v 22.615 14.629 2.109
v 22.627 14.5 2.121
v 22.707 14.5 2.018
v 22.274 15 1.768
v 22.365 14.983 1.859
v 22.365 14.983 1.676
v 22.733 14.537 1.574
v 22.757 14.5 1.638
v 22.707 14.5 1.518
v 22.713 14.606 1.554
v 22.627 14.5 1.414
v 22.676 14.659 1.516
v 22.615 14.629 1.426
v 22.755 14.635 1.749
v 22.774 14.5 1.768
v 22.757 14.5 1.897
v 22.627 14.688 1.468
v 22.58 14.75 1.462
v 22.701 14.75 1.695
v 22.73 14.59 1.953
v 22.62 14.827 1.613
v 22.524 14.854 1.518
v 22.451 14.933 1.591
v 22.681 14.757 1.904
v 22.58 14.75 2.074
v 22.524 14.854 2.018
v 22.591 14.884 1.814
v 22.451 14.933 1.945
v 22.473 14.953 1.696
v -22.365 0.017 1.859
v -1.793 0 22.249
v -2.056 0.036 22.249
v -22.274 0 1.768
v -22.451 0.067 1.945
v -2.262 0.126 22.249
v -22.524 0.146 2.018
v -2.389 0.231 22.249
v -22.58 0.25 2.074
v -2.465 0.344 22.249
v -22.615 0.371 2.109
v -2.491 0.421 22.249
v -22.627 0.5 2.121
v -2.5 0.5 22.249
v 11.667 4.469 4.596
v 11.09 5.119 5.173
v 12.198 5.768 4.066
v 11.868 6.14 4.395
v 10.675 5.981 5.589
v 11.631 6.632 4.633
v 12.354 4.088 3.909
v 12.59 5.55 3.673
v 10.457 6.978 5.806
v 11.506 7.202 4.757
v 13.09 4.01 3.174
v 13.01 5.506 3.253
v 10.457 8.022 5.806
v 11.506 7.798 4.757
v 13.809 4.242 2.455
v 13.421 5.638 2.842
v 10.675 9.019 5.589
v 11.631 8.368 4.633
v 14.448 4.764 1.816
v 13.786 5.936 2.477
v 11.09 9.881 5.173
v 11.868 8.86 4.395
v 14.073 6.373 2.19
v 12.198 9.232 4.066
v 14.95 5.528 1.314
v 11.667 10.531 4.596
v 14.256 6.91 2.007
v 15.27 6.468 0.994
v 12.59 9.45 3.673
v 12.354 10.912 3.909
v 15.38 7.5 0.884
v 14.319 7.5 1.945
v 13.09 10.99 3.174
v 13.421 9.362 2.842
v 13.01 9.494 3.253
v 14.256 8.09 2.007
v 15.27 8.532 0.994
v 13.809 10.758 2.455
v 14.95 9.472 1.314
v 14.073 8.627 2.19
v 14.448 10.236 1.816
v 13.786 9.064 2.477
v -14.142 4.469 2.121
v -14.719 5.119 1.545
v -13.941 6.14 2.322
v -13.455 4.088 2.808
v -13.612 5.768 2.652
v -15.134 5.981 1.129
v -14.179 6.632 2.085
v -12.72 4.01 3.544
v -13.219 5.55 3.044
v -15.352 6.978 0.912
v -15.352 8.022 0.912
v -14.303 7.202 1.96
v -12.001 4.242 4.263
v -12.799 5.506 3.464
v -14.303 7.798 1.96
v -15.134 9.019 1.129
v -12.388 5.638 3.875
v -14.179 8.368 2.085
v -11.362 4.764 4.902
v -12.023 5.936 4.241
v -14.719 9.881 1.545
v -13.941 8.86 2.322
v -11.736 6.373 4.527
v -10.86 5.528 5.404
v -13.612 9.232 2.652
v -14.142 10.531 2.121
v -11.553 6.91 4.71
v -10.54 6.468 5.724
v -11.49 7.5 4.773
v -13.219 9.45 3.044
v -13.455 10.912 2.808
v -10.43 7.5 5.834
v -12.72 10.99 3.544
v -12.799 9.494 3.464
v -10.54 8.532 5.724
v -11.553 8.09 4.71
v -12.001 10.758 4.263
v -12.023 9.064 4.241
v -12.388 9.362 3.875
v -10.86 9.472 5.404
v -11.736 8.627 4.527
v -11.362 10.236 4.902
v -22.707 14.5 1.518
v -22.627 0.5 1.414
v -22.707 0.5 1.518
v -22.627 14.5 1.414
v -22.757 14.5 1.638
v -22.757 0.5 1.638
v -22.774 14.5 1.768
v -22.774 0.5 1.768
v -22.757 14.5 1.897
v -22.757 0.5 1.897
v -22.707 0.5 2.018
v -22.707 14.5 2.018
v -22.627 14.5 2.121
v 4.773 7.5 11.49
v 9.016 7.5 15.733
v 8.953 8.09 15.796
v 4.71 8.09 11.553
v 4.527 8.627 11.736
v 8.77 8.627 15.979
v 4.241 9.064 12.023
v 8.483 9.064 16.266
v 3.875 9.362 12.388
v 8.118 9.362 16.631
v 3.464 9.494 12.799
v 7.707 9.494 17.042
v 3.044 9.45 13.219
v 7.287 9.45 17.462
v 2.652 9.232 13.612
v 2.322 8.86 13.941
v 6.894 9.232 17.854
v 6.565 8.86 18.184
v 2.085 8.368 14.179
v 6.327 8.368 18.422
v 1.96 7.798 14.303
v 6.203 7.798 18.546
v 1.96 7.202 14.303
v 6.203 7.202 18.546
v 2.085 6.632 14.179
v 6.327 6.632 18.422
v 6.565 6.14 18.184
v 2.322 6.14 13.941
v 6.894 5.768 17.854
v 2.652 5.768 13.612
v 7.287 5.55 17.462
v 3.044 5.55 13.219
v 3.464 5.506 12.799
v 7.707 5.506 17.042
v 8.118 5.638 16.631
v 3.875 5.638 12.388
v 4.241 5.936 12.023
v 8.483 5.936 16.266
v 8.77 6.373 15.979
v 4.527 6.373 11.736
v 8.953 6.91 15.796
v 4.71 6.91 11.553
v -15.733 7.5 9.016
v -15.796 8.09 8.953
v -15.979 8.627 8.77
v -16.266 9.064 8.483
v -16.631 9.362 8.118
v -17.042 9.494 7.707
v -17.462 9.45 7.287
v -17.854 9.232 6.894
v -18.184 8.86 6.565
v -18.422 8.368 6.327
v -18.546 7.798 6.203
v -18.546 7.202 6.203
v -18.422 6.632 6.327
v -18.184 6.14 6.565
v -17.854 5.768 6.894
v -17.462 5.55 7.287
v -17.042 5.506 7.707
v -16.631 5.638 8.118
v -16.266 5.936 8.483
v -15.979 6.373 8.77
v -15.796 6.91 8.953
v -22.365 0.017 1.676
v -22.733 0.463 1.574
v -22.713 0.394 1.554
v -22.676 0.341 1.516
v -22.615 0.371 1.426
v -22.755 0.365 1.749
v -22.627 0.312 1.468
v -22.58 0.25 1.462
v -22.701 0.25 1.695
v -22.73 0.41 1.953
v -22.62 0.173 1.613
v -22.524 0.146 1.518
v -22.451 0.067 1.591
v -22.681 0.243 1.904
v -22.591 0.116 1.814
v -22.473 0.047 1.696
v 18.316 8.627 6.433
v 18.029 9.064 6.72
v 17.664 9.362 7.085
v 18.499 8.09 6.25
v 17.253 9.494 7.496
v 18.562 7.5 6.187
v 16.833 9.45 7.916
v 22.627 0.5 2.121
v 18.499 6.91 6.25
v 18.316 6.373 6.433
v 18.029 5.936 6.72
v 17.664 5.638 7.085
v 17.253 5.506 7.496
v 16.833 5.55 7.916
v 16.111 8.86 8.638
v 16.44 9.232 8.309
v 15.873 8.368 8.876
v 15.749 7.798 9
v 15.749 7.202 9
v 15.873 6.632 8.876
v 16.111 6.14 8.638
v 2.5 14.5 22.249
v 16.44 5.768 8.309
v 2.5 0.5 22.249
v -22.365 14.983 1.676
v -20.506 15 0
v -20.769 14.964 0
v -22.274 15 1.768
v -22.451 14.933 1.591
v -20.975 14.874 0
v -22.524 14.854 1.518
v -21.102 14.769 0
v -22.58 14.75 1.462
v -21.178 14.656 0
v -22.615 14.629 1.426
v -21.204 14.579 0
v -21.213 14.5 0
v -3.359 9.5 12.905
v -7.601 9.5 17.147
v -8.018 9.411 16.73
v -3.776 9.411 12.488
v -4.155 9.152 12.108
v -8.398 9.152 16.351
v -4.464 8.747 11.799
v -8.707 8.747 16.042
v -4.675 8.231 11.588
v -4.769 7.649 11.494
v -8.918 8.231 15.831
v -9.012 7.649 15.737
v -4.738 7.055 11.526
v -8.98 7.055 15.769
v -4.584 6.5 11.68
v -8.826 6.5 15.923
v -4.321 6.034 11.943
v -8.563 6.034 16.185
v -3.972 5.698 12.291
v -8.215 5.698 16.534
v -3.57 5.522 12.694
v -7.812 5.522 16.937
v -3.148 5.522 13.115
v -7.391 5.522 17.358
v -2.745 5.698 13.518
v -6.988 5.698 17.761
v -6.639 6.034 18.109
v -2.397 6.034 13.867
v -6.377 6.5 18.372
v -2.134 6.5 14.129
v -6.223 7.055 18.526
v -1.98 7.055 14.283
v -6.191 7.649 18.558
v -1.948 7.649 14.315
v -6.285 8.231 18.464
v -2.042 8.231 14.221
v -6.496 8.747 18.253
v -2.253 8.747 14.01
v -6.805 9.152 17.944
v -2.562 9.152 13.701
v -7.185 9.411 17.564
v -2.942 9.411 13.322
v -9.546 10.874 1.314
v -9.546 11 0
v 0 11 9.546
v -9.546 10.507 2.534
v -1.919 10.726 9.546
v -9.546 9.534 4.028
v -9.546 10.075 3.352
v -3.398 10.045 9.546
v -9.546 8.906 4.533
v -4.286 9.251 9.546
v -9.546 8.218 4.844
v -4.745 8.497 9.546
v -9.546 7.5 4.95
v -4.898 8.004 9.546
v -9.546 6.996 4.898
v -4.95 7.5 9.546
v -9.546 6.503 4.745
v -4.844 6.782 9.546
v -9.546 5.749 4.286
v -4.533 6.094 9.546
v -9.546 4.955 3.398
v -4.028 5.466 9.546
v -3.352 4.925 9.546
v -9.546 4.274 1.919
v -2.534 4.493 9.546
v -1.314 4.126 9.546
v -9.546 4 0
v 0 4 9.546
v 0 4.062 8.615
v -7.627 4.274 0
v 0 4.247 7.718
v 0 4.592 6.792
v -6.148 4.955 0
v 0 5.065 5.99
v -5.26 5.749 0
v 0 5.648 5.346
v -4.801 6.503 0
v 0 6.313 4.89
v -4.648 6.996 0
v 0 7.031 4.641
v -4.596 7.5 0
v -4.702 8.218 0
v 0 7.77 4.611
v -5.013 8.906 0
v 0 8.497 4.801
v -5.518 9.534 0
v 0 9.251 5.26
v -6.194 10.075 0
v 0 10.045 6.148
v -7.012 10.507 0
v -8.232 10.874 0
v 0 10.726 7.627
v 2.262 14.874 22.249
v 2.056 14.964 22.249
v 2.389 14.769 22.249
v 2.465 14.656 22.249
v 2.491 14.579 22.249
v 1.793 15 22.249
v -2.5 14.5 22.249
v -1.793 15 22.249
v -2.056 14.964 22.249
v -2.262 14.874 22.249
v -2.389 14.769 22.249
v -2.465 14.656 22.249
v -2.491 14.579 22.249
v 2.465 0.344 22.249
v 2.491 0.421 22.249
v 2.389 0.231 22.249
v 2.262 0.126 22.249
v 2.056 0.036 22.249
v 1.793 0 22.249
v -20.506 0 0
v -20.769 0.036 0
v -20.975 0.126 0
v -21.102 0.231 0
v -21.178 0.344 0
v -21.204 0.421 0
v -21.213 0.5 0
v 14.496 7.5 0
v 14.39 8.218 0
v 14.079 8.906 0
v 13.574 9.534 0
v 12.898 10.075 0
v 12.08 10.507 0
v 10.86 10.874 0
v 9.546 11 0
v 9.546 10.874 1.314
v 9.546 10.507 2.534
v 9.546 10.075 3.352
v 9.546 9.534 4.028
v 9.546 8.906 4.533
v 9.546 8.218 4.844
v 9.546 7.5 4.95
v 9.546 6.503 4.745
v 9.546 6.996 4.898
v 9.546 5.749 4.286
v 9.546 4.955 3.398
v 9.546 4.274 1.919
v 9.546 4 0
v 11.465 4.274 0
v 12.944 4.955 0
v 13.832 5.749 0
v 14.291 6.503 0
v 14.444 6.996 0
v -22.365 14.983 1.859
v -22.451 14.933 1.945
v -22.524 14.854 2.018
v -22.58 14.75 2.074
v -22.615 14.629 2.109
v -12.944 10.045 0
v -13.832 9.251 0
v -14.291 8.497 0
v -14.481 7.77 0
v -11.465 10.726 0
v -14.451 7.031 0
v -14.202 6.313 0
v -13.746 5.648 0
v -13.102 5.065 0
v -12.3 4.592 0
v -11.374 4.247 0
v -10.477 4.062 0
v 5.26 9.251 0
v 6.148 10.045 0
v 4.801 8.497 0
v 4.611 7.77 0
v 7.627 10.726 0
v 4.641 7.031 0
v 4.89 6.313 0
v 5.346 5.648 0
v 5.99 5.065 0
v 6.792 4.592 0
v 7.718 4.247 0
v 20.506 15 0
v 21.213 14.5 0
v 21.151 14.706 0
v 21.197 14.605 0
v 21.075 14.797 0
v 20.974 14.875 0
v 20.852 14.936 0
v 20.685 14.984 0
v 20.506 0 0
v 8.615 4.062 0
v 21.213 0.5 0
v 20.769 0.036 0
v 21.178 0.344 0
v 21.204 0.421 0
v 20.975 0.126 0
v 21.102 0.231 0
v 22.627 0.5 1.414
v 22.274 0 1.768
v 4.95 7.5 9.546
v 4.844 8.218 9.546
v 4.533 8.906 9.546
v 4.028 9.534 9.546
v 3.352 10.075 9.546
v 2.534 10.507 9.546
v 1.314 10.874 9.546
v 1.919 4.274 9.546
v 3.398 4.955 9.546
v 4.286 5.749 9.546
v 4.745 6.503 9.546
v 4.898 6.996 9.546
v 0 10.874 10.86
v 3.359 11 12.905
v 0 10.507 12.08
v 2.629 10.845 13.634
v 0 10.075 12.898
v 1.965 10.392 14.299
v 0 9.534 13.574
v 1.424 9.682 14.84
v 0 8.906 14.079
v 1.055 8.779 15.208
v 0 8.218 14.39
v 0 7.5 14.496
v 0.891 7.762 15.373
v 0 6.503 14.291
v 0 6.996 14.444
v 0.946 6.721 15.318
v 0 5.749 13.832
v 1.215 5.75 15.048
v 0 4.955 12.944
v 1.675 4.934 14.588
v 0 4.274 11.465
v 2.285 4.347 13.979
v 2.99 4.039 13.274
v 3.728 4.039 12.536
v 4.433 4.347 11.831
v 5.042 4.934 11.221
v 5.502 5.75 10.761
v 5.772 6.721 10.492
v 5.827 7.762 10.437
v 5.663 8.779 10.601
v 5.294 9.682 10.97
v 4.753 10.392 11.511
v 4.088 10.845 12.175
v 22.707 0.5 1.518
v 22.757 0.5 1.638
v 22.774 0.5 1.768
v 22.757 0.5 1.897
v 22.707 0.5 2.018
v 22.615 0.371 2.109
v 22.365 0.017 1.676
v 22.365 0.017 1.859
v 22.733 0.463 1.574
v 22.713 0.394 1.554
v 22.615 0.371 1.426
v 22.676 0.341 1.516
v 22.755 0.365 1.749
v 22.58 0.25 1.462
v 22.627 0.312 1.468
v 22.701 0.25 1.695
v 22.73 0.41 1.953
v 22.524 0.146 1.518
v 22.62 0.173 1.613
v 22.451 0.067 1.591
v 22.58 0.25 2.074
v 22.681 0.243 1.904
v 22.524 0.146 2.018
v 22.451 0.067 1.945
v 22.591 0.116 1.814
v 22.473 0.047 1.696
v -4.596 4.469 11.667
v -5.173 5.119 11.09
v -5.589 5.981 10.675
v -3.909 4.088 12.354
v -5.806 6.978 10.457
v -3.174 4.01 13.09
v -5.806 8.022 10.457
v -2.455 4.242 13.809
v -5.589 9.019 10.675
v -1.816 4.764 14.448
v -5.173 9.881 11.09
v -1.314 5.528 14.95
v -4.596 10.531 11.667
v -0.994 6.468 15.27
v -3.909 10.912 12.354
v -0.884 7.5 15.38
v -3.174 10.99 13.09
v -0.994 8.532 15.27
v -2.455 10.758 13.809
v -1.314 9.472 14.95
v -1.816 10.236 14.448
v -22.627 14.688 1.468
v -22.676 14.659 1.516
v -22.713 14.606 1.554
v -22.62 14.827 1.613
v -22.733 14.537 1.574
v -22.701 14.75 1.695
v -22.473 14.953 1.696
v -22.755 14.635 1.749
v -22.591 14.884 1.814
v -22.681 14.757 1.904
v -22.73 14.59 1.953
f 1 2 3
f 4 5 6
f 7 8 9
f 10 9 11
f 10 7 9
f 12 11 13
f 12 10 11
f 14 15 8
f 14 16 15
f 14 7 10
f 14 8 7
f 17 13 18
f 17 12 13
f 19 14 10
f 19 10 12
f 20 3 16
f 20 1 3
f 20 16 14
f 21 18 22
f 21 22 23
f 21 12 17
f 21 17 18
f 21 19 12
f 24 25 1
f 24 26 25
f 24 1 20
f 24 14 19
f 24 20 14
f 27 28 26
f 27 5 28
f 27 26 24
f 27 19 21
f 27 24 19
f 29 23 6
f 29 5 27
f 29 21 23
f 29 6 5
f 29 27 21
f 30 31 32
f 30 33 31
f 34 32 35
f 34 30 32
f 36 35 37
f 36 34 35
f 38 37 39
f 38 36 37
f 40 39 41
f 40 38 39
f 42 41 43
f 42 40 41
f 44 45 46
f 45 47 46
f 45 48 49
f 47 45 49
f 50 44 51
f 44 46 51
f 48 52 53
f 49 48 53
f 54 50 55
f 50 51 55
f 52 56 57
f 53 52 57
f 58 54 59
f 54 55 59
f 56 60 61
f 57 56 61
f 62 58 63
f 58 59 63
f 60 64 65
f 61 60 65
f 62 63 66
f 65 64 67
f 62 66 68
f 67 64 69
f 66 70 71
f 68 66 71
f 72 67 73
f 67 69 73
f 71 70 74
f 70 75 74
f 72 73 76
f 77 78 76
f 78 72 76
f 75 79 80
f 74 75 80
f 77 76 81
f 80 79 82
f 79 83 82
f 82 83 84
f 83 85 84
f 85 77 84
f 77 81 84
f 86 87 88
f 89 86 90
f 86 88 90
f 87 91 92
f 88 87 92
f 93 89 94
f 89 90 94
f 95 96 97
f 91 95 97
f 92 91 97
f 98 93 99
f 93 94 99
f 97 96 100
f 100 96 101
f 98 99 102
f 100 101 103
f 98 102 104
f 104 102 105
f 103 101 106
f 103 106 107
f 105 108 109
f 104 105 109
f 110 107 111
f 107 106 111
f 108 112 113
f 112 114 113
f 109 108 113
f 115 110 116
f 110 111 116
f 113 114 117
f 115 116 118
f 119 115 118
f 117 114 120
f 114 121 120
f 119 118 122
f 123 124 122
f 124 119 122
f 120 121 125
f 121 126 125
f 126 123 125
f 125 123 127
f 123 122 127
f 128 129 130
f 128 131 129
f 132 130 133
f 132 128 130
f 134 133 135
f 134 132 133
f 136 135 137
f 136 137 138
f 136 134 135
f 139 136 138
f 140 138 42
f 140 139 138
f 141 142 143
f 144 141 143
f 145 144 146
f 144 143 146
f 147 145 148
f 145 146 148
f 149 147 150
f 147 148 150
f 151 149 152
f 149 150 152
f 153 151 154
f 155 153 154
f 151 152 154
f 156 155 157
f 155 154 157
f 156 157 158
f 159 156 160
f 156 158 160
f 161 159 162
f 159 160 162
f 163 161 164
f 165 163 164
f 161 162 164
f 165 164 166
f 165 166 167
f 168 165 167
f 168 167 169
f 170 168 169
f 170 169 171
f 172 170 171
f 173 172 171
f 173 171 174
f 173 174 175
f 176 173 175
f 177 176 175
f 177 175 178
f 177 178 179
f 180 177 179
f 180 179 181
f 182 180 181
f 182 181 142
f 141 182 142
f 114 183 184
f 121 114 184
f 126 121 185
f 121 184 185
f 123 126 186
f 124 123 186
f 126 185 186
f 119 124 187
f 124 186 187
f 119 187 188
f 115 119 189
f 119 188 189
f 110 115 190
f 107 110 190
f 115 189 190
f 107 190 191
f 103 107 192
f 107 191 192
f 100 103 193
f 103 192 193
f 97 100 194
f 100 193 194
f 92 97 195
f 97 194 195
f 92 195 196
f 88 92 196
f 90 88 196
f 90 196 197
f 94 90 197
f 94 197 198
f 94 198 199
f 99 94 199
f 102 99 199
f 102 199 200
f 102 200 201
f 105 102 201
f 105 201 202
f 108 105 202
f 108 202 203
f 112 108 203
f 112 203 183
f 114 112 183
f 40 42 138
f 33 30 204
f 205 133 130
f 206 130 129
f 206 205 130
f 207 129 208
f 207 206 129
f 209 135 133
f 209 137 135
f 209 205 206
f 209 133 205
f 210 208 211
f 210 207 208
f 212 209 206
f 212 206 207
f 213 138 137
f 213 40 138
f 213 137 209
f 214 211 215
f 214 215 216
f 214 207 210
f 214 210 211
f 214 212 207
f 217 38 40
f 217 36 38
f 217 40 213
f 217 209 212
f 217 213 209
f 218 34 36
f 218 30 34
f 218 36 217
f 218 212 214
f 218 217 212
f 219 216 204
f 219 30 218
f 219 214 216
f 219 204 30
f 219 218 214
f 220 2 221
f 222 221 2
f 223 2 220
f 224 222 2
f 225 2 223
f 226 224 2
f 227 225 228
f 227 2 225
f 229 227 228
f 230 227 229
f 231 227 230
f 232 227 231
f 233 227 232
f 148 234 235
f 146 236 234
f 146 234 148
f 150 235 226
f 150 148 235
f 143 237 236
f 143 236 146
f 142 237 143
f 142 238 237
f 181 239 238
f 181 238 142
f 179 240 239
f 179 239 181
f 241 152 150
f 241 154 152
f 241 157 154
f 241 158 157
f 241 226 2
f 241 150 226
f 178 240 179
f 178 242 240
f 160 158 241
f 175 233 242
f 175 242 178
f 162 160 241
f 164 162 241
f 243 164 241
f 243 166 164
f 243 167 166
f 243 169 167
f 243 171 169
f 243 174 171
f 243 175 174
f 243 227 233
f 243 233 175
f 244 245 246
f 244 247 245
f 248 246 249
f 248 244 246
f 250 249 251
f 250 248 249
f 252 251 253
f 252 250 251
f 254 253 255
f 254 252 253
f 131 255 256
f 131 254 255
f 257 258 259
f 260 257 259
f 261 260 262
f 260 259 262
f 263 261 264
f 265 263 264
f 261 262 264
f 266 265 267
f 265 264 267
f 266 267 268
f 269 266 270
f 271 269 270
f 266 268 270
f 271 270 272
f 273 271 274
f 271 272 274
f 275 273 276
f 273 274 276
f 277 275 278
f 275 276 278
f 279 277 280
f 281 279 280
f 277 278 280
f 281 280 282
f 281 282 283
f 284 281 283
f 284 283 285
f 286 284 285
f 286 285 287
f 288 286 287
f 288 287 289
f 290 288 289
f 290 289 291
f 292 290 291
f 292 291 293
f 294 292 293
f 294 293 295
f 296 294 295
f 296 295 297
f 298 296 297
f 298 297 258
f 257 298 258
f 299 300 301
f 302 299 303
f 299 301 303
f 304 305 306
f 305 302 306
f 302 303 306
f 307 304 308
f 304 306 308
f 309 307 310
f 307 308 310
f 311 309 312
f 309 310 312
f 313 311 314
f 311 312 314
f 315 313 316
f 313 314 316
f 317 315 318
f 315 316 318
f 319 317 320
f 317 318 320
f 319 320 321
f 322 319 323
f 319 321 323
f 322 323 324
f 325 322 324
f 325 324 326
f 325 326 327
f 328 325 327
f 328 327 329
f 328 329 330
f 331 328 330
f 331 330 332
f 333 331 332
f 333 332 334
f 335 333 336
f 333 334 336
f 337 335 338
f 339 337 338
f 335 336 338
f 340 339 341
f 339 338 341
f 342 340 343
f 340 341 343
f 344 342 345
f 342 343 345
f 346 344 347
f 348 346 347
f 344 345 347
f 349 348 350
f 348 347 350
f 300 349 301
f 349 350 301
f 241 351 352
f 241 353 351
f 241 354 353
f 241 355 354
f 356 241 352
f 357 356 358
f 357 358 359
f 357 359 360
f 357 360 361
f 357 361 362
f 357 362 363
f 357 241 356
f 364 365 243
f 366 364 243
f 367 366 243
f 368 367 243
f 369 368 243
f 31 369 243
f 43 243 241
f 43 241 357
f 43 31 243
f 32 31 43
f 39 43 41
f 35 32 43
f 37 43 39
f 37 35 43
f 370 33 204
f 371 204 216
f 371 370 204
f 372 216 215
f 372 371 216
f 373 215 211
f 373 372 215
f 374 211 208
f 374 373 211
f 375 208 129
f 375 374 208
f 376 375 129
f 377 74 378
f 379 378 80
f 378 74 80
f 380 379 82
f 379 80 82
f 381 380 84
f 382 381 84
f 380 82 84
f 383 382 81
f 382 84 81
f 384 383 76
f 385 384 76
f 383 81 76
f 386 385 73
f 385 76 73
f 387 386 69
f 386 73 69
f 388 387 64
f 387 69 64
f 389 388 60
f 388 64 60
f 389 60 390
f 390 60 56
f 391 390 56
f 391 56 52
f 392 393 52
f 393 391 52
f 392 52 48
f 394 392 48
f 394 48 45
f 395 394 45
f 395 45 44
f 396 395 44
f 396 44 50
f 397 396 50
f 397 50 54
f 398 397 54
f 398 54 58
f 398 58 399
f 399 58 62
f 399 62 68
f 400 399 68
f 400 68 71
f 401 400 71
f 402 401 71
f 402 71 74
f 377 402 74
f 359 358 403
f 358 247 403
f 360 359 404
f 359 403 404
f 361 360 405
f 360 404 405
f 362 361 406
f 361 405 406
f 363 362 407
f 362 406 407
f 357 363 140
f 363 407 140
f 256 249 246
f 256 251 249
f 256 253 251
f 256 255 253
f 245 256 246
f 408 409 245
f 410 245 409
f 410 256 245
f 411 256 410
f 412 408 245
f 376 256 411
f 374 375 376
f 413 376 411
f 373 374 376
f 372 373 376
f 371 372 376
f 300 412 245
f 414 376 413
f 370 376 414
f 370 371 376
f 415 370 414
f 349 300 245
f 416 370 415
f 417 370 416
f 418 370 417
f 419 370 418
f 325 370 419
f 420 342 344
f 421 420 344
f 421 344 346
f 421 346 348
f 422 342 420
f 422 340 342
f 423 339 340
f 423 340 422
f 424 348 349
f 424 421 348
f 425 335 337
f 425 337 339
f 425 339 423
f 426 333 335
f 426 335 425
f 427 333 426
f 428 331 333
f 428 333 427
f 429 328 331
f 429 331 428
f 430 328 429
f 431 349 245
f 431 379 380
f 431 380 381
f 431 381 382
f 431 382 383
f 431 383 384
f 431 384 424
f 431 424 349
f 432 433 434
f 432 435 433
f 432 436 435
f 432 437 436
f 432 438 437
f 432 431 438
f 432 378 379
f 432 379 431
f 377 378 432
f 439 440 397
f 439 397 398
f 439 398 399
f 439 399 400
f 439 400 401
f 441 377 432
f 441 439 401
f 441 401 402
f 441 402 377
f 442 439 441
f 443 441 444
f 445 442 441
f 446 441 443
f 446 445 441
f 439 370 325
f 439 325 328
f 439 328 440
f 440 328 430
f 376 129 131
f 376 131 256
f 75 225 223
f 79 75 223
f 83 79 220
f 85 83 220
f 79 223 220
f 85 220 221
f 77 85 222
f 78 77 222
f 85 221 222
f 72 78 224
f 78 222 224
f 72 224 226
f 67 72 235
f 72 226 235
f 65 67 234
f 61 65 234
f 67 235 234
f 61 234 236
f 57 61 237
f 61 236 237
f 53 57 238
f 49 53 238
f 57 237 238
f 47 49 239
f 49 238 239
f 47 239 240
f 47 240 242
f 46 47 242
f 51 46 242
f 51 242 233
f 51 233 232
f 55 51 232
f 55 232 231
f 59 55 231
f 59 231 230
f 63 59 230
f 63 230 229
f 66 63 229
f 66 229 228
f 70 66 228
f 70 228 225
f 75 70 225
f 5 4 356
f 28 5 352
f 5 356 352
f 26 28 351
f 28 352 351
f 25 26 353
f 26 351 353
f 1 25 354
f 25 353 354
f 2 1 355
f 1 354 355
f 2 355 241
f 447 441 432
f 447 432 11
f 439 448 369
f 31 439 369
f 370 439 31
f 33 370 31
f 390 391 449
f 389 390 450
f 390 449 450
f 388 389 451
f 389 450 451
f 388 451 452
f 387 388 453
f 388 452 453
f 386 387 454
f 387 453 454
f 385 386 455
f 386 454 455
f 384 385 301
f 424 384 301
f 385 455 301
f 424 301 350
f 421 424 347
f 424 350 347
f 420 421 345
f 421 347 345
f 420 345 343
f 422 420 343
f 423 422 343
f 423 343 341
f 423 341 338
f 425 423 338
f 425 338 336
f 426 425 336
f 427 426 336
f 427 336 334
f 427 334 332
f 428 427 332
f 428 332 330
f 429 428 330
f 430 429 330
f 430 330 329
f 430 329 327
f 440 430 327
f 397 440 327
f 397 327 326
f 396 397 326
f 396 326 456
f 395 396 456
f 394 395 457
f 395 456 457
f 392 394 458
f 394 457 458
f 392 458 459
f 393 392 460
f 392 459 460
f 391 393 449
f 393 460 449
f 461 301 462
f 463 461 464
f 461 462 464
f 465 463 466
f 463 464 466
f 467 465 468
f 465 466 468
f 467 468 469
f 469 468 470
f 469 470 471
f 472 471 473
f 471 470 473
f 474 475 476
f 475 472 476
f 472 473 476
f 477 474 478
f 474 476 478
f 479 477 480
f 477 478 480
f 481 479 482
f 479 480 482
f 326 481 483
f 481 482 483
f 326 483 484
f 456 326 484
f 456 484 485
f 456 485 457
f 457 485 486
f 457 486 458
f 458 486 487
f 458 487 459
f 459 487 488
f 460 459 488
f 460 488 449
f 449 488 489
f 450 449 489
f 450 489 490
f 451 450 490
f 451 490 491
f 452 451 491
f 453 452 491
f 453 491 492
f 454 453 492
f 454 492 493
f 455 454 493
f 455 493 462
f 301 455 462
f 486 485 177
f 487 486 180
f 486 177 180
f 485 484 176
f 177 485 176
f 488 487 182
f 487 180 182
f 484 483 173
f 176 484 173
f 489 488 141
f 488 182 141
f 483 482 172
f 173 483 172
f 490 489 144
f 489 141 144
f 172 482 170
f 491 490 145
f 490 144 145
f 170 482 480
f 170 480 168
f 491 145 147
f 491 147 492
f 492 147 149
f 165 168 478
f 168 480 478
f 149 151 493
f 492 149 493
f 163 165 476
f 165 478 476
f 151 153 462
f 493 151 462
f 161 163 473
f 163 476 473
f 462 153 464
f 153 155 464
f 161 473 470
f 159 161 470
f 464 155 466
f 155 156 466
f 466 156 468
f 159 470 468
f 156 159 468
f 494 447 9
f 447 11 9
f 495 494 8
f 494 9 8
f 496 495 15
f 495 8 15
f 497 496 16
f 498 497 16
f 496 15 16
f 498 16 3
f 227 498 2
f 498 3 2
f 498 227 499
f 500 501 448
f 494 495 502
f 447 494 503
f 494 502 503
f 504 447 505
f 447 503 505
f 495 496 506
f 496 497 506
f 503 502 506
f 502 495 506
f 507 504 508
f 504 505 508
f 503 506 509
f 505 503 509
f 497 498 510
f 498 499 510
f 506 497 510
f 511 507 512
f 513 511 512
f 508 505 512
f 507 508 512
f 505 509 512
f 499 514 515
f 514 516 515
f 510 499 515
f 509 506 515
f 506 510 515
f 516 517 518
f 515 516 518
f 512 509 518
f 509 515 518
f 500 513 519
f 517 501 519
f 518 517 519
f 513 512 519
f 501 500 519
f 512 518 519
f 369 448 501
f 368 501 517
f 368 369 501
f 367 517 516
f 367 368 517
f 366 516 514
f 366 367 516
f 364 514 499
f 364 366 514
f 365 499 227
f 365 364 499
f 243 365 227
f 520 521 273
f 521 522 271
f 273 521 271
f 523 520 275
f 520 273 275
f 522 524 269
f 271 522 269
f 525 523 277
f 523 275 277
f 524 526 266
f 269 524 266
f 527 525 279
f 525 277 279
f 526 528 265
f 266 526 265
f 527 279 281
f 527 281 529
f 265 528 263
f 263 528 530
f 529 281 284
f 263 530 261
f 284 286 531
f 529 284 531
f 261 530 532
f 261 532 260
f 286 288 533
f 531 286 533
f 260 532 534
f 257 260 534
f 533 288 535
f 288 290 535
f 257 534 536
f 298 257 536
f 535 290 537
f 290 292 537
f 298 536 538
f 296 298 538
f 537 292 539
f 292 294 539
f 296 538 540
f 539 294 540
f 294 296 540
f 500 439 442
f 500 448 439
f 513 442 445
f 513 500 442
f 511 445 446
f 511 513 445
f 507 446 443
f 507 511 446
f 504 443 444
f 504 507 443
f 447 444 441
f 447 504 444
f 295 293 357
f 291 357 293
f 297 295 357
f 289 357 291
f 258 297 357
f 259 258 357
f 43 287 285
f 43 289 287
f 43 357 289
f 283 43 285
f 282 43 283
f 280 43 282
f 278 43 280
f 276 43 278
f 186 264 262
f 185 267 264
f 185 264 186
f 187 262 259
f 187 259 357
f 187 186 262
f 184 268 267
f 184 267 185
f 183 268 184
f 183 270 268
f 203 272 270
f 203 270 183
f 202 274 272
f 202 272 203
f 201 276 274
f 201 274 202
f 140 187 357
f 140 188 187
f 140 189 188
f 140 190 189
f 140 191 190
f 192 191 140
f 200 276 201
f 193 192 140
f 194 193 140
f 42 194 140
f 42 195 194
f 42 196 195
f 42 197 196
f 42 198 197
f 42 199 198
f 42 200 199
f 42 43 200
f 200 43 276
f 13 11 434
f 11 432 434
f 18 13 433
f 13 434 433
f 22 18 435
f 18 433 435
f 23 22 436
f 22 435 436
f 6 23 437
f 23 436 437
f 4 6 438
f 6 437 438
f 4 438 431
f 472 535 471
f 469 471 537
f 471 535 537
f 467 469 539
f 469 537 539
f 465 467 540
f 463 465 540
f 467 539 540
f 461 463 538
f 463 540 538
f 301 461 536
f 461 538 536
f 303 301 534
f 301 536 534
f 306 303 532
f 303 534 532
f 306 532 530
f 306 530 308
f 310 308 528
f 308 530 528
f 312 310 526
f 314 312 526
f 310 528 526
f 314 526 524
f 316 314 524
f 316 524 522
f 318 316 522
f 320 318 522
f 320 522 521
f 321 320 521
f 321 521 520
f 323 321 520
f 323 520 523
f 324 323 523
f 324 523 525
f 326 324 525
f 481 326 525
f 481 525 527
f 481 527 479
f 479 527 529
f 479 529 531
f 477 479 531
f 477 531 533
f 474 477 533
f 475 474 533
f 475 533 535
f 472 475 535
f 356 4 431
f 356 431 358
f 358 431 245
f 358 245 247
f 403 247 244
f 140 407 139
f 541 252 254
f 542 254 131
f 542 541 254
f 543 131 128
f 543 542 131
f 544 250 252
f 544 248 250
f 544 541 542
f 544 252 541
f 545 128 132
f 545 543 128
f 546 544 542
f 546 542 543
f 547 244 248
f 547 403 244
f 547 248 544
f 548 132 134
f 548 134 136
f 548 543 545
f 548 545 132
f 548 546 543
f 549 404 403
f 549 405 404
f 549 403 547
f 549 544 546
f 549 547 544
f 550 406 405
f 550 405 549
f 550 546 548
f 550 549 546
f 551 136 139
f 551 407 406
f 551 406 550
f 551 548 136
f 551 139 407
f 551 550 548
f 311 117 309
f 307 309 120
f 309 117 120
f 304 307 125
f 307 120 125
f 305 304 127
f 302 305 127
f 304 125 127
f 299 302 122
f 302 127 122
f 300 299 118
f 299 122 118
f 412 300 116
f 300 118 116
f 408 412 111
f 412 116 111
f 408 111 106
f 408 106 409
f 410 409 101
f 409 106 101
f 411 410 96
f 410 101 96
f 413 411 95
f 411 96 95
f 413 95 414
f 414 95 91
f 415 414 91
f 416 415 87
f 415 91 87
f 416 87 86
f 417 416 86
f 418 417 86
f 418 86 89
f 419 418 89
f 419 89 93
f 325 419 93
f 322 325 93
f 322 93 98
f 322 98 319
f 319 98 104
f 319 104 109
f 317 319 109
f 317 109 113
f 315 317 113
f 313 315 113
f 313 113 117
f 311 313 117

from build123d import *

# Parameters (mm, degrees)
BOSS_EXTRUDE1_DEPTH = 15
CUT_EXTRUDE5_REACH  = 43.908
SKETCH9_R           = 2
CUT_EXTRUDE6_REACH  = 43.908
SKETCH10_R          = 2
CUT_EXTRUDE7_REACH  = 40.079
FILLET1_R           = 0.5
CUT_EXTRUDE8_REACH  = 39.141
SKETCH11_R          = 3.5
CUT_EXTRUDE9_REACH  = 39.141
SKETCH12_R          = 3.5


with BuildPart() as part:
    # Sketch1 → Boss-Extrude1 (new body)
    with BuildSketch(Plane(origin=(0, 0, 0), x_dir=(1, 0, 0), z_dir=(0, 1, 0))):
        Polygon((-24.748737342, 0), (24.748737342, 0), (0, -24.748737342), align=None)
    extrude(amount=BOSS_EXTRUDE1_DEPTH)

    # Cut-Extrude5: up to this plane
    cut_extrude5_end = Plane(origin=(-24.748737342, 15, 0), z_dir=(0, 0, 1))
    # Sketch9 → Cut-Extrude5 (cut, up to the surface)
    with BuildSketch(Plane(origin=(12.374368671, 0, 12.374368671), x_dir=(0.7071067811865474, 0, -0.7071067811865477), z_dir=(0.7071067811865477, 0, 0.7071067811865474)), mode=Mode.PRIVATE) as cut_extrude5_sk1:
        with Locations((-6.75, 7.5)):
            Circle(SKETCH9_R)
    cut_extrude5_tool1 = split(extrude(cut_extrude5_sk1.sketch, amount=-CUT_EXTRUDE5_REACH, mode=Mode.PRIVATE), bisect_by=cut_extrude5_end, keep=Keep.BOTH, mode=Mode.PRIVATE)
    add(cut_extrude5_tool1.solids().sort_by_distance((7.601398, 7.5, 17.147339))[0], mode=Mode.SUBTRACT)
    # Sketch9 → Cut-Extrude5 (cut, up to the surface)
    with BuildSketch(Plane(origin=(12.374368671, 0, 12.374368671), x_dir=(0.7071067811865474, 0, -0.7071067811865477), z_dir=(0.7071067811865477, 0, 0.7071067811865474)), mode=Mode.PRIVATE) as cut_extrude5_sk2:
        with Locations((6.75, 7.5)):
            Circle(SKETCH9_R)
    cut_extrude5_tool2 = split(extrude(cut_extrude5_sk2.sketch, amount=-CUT_EXTRUDE5_REACH, mode=Mode.PRIVATE), bisect_by=cut_extrude5_end, keep=Keep.BOTH, mode=Mode.PRIVATE)
    add(cut_extrude5_tool2.solids().sort_by_distance((17.147339, 7.5, 7.601398))[0], mode=Mode.SUBTRACT)

    # Cut-Extrude6: up to this plane
    cut_extrude6_end = Plane(origin=(-24.748737342, 15, 0), z_dir=(0, 0, 1))
    # Sketch10 → Cut-Extrude6 (cut, up to the surface)
    with BuildSketch(Plane(origin=(-12.374368671, 0, 12.374368671), x_dir=(0.7071067811865472, 0, 0.7071067811865479), z_dir=(-0.7071067811865479, 0, 0.7071067811865472)), mode=Mode.PRIVATE) as cut_extrude6_sk1:
        with Locations((-6.75, 7.5)):
            Circle(SKETCH10_R)
    cut_extrude6_tool1 = split(extrude(cut_extrude6_sk1.sketch, amount=-CUT_EXTRUDE6_REACH, mode=Mode.PRIVATE), bisect_by=cut_extrude6_end, keep=Keep.BOTH, mode=Mode.PRIVATE)
    add(cut_extrude6_tool1.solids().sort_by_distance((-17.147339, 7.5, 7.601398))[0], mode=Mode.SUBTRACT)
    # Sketch10 → Cut-Extrude6 (cut, up to the surface)
    with BuildSketch(Plane(origin=(-12.374368671, 0, 12.374368671), x_dir=(0.7071067811865472, 0, 0.7071067811865479), z_dir=(-0.7071067811865479, 0, 0.7071067811865472)), mode=Mode.PRIVATE) as cut_extrude6_sk2:
        with Locations(Location((6.75, 7.5, 0), (0, 0, 90))):
            Circle(SKETCH10_R)
    cut_extrude6_tool2 = split(extrude(cut_extrude6_sk2.sketch, amount=-CUT_EXTRUDE6_REACH, mode=Mode.PRIVATE), bisect_by=cut_extrude6_end, keep=Keep.BOTH, mode=Mode.PRIVATE)
    add(cut_extrude6_tool2.solids().sort_by_distance((-7.601398, 7.5, 17.147339))[0], mode=Mode.SUBTRACT)

    # Sketch3 → Cut-Extrude7 (cut, up to next)
    with BuildSketch(Plane.XZ, mode=Mode.PRIVATE) as cut_extrude7_sk1:
        Polygon((-2.5, 22.248737342), (0, 24.748737342), (2.5, 22.248737342), align=None)
    cut_extrude7_tool1 = extrude(cut_extrude7_sk1.sketch, amount=-CUT_EXTRUDE7_REACH, mode=Mode.PRIVATE) & part.part
    # Sketch3 → Cut-Extrude7 (cut, up to next)
    with BuildSketch(Plane.XZ, mode=Mode.PRIVATE) as cut_extrude7_sk2:
        Polygon((-24.748737342, 0), (-22.980970389, 1.767766953), (-21.213203436, 0), align=None)
    cut_extrude7_tool2 = extrude(cut_extrude7_sk2.sketch, amount=-CUT_EXTRUDE7_REACH, mode=Mode.PRIVATE) & part.part
    # Sketch3 → Cut-Extrude7 (cut, up to next)
    with BuildSketch(Plane.XZ, mode=Mode.PRIVATE) as cut_extrude7_sk3:
        Polygon((24.748737342, 0), (21.213203436, 0), (22.980970389, 1.767766953), align=None)
    cut_extrude7_tool3 = extrude(cut_extrude7_sk3.sketch, amount=-CUT_EXTRUDE7_REACH, mode=Mode.PRIVATE) & part.part
    add(cut_extrude7_tool1.solids().sort_by_distance((0, 0, 23.082071))[0], mode=Mode.SUBTRACT)
    add(cut_extrude7_tool2.solids().sort_by_distance((-22.98097, 0, 0.589256))[0], mode=Mode.SUBTRACT)
    add(cut_extrude7_tool3.solids().sort_by_distance((22.98097, 0, 0.589256))[0], mode=Mode.SUBTRACT)

    # Fillet1
    fillet1_edges = [part.edges().sort_by_distance(p)[0] for p in [
        (-12.740485194, 0, 12.008252147),
        (12.740485194, 0, 12.008252147),
        (-12.740485194, 15, 12.008252147),
        (12.740485194, 15, 12.008252147),
        (22.980970389, 7.5, 1.767766953),
        (22.097086912, 15, 0.883883476),
        (22.097086912, 0, 0.883883476),
        (-22.097086912, 15, 0.883883476),
        (-22.980970389, 7.5, 1.767766953),
        (-22.097086912, 0, 0.883883476),
    ]]
    fillet(fillet1_edges, radius=FILLET1_R)

    # Cut-Extrude8: up to this plane
    cut_extrude8_end = Plane(origin=(-24.748737342, 15, 0), z_dir=(0, 0, 1))
    # Sketch11 → Cut-Extrude8 (cut, up to the surface)
    with BuildSketch(Plane(origin=(-8.131727984, 0, 8.131727984), x_dir=(0.7071067811865475, 0, 0.7071067811865477), z_dir=(-0.7071067811865477, 0, 0.7071067811865475)), mode=Mode.PRIVATE) as cut_extrude8_sk1:
        with Locations((-6.75, 7.5)):
            Circle(SKETCH11_R)
    cut_extrude8_tool1 = split(extrude(cut_extrude8_sk1.sketch, amount=-CUT_EXTRUDE8_REACH, mode=Mode.PRIVATE), bisect_by=cut_extrude8_end, keep=Keep.BOTH, mode=Mode.PRIVATE)
    add(cut_extrude8_tool1.solids().sort_by_distance((-12.904699, 7.5, 3.358757))[0], mode=Mode.SUBTRACT)
    # Sketch11 → Cut-Extrude8 (cut, up to the surface)
    with BuildSketch(Plane(origin=(-8.131727984, 0, 8.131727984), x_dir=(0.7071067811865475, 0, 0.7071067811865477), z_dir=(-0.7071067811865477, 0, 0.7071067811865475)), mode=Mode.PRIVATE) as cut_extrude8_sk2:
        with Locations((6.75, 7.5)):
            Circle(SKETCH11_R)
    cut_extrude8_tool2 = split(extrude(cut_extrude8_sk2.sketch, amount=-CUT_EXTRUDE8_REACH, mode=Mode.PRIVATE), bisect_by=cut_extrude8_end, keep=Keep.BOTH, mode=Mode.PRIVATE)
    add(cut_extrude8_tool2.solids().sort_by_distance((-3.358757, 7.5, 12.904699))[0], mode=Mode.SUBTRACT)

    # Cut-Extrude9: up to this plane
    cut_extrude9_end = Plane(origin=(-24.748737342, 15, 0), z_dir=(0, 0, 1))
    # Sketch12 → Cut-Extrude9 (cut, up to the surface)
    with BuildSketch(Plane(origin=(8.131727984, 0, 8.131727984), x_dir=(0.7071067811865474, 0, -0.7071067811865477), z_dir=(0.7071067811865477, 0, 0.7071067811865474)), mode=Mode.PRIVATE) as cut_extrude9_sk1:
        with Locations((6.75, 7.5)):
            Circle(SKETCH12_R)
    cut_extrude9_tool1 = split(extrude(cut_extrude9_sk1.sketch, amount=-CUT_EXTRUDE9_REACH, mode=Mode.PRIVATE), bisect_by=cut_extrude9_end, keep=Keep.BOTH, mode=Mode.PRIVATE)
    add(cut_extrude9_tool1.solids().sort_by_distance((12.904699, 7.5, 3.358757))[0], mode=Mode.SUBTRACT)
    # Sketch12 → Cut-Extrude9 (cut, up to the surface)
    with BuildSketch(Plane(origin=(8.131727984, 0, 8.131727984), x_dir=(0.7071067811865474, 0, -0.7071067811865477), z_dir=(0.7071067811865477, 0, 0.7071067811865474)), mode=Mode.PRIVATE) as cut_extrude9_sk2:
        with Locations(Location((-6.75, 7.5, 0), (0, 0, 90))):
            Circle(SKETCH12_R)
    cut_extrude9_tool2 = split(extrude(cut_extrude9_sk2.sketch, amount=-CUT_EXTRUDE9_REACH, mode=Mode.PRIVATE), bisect_by=cut_extrude9_end, keep=Keep.BOTH, mode=Mode.PRIVATE)
    add(cut_extrude9_tool2.solids().sort_by_distance((3.358757, 7.5, 12.904699))[0], mode=Mode.SUBTRACT)


solid = part.part
